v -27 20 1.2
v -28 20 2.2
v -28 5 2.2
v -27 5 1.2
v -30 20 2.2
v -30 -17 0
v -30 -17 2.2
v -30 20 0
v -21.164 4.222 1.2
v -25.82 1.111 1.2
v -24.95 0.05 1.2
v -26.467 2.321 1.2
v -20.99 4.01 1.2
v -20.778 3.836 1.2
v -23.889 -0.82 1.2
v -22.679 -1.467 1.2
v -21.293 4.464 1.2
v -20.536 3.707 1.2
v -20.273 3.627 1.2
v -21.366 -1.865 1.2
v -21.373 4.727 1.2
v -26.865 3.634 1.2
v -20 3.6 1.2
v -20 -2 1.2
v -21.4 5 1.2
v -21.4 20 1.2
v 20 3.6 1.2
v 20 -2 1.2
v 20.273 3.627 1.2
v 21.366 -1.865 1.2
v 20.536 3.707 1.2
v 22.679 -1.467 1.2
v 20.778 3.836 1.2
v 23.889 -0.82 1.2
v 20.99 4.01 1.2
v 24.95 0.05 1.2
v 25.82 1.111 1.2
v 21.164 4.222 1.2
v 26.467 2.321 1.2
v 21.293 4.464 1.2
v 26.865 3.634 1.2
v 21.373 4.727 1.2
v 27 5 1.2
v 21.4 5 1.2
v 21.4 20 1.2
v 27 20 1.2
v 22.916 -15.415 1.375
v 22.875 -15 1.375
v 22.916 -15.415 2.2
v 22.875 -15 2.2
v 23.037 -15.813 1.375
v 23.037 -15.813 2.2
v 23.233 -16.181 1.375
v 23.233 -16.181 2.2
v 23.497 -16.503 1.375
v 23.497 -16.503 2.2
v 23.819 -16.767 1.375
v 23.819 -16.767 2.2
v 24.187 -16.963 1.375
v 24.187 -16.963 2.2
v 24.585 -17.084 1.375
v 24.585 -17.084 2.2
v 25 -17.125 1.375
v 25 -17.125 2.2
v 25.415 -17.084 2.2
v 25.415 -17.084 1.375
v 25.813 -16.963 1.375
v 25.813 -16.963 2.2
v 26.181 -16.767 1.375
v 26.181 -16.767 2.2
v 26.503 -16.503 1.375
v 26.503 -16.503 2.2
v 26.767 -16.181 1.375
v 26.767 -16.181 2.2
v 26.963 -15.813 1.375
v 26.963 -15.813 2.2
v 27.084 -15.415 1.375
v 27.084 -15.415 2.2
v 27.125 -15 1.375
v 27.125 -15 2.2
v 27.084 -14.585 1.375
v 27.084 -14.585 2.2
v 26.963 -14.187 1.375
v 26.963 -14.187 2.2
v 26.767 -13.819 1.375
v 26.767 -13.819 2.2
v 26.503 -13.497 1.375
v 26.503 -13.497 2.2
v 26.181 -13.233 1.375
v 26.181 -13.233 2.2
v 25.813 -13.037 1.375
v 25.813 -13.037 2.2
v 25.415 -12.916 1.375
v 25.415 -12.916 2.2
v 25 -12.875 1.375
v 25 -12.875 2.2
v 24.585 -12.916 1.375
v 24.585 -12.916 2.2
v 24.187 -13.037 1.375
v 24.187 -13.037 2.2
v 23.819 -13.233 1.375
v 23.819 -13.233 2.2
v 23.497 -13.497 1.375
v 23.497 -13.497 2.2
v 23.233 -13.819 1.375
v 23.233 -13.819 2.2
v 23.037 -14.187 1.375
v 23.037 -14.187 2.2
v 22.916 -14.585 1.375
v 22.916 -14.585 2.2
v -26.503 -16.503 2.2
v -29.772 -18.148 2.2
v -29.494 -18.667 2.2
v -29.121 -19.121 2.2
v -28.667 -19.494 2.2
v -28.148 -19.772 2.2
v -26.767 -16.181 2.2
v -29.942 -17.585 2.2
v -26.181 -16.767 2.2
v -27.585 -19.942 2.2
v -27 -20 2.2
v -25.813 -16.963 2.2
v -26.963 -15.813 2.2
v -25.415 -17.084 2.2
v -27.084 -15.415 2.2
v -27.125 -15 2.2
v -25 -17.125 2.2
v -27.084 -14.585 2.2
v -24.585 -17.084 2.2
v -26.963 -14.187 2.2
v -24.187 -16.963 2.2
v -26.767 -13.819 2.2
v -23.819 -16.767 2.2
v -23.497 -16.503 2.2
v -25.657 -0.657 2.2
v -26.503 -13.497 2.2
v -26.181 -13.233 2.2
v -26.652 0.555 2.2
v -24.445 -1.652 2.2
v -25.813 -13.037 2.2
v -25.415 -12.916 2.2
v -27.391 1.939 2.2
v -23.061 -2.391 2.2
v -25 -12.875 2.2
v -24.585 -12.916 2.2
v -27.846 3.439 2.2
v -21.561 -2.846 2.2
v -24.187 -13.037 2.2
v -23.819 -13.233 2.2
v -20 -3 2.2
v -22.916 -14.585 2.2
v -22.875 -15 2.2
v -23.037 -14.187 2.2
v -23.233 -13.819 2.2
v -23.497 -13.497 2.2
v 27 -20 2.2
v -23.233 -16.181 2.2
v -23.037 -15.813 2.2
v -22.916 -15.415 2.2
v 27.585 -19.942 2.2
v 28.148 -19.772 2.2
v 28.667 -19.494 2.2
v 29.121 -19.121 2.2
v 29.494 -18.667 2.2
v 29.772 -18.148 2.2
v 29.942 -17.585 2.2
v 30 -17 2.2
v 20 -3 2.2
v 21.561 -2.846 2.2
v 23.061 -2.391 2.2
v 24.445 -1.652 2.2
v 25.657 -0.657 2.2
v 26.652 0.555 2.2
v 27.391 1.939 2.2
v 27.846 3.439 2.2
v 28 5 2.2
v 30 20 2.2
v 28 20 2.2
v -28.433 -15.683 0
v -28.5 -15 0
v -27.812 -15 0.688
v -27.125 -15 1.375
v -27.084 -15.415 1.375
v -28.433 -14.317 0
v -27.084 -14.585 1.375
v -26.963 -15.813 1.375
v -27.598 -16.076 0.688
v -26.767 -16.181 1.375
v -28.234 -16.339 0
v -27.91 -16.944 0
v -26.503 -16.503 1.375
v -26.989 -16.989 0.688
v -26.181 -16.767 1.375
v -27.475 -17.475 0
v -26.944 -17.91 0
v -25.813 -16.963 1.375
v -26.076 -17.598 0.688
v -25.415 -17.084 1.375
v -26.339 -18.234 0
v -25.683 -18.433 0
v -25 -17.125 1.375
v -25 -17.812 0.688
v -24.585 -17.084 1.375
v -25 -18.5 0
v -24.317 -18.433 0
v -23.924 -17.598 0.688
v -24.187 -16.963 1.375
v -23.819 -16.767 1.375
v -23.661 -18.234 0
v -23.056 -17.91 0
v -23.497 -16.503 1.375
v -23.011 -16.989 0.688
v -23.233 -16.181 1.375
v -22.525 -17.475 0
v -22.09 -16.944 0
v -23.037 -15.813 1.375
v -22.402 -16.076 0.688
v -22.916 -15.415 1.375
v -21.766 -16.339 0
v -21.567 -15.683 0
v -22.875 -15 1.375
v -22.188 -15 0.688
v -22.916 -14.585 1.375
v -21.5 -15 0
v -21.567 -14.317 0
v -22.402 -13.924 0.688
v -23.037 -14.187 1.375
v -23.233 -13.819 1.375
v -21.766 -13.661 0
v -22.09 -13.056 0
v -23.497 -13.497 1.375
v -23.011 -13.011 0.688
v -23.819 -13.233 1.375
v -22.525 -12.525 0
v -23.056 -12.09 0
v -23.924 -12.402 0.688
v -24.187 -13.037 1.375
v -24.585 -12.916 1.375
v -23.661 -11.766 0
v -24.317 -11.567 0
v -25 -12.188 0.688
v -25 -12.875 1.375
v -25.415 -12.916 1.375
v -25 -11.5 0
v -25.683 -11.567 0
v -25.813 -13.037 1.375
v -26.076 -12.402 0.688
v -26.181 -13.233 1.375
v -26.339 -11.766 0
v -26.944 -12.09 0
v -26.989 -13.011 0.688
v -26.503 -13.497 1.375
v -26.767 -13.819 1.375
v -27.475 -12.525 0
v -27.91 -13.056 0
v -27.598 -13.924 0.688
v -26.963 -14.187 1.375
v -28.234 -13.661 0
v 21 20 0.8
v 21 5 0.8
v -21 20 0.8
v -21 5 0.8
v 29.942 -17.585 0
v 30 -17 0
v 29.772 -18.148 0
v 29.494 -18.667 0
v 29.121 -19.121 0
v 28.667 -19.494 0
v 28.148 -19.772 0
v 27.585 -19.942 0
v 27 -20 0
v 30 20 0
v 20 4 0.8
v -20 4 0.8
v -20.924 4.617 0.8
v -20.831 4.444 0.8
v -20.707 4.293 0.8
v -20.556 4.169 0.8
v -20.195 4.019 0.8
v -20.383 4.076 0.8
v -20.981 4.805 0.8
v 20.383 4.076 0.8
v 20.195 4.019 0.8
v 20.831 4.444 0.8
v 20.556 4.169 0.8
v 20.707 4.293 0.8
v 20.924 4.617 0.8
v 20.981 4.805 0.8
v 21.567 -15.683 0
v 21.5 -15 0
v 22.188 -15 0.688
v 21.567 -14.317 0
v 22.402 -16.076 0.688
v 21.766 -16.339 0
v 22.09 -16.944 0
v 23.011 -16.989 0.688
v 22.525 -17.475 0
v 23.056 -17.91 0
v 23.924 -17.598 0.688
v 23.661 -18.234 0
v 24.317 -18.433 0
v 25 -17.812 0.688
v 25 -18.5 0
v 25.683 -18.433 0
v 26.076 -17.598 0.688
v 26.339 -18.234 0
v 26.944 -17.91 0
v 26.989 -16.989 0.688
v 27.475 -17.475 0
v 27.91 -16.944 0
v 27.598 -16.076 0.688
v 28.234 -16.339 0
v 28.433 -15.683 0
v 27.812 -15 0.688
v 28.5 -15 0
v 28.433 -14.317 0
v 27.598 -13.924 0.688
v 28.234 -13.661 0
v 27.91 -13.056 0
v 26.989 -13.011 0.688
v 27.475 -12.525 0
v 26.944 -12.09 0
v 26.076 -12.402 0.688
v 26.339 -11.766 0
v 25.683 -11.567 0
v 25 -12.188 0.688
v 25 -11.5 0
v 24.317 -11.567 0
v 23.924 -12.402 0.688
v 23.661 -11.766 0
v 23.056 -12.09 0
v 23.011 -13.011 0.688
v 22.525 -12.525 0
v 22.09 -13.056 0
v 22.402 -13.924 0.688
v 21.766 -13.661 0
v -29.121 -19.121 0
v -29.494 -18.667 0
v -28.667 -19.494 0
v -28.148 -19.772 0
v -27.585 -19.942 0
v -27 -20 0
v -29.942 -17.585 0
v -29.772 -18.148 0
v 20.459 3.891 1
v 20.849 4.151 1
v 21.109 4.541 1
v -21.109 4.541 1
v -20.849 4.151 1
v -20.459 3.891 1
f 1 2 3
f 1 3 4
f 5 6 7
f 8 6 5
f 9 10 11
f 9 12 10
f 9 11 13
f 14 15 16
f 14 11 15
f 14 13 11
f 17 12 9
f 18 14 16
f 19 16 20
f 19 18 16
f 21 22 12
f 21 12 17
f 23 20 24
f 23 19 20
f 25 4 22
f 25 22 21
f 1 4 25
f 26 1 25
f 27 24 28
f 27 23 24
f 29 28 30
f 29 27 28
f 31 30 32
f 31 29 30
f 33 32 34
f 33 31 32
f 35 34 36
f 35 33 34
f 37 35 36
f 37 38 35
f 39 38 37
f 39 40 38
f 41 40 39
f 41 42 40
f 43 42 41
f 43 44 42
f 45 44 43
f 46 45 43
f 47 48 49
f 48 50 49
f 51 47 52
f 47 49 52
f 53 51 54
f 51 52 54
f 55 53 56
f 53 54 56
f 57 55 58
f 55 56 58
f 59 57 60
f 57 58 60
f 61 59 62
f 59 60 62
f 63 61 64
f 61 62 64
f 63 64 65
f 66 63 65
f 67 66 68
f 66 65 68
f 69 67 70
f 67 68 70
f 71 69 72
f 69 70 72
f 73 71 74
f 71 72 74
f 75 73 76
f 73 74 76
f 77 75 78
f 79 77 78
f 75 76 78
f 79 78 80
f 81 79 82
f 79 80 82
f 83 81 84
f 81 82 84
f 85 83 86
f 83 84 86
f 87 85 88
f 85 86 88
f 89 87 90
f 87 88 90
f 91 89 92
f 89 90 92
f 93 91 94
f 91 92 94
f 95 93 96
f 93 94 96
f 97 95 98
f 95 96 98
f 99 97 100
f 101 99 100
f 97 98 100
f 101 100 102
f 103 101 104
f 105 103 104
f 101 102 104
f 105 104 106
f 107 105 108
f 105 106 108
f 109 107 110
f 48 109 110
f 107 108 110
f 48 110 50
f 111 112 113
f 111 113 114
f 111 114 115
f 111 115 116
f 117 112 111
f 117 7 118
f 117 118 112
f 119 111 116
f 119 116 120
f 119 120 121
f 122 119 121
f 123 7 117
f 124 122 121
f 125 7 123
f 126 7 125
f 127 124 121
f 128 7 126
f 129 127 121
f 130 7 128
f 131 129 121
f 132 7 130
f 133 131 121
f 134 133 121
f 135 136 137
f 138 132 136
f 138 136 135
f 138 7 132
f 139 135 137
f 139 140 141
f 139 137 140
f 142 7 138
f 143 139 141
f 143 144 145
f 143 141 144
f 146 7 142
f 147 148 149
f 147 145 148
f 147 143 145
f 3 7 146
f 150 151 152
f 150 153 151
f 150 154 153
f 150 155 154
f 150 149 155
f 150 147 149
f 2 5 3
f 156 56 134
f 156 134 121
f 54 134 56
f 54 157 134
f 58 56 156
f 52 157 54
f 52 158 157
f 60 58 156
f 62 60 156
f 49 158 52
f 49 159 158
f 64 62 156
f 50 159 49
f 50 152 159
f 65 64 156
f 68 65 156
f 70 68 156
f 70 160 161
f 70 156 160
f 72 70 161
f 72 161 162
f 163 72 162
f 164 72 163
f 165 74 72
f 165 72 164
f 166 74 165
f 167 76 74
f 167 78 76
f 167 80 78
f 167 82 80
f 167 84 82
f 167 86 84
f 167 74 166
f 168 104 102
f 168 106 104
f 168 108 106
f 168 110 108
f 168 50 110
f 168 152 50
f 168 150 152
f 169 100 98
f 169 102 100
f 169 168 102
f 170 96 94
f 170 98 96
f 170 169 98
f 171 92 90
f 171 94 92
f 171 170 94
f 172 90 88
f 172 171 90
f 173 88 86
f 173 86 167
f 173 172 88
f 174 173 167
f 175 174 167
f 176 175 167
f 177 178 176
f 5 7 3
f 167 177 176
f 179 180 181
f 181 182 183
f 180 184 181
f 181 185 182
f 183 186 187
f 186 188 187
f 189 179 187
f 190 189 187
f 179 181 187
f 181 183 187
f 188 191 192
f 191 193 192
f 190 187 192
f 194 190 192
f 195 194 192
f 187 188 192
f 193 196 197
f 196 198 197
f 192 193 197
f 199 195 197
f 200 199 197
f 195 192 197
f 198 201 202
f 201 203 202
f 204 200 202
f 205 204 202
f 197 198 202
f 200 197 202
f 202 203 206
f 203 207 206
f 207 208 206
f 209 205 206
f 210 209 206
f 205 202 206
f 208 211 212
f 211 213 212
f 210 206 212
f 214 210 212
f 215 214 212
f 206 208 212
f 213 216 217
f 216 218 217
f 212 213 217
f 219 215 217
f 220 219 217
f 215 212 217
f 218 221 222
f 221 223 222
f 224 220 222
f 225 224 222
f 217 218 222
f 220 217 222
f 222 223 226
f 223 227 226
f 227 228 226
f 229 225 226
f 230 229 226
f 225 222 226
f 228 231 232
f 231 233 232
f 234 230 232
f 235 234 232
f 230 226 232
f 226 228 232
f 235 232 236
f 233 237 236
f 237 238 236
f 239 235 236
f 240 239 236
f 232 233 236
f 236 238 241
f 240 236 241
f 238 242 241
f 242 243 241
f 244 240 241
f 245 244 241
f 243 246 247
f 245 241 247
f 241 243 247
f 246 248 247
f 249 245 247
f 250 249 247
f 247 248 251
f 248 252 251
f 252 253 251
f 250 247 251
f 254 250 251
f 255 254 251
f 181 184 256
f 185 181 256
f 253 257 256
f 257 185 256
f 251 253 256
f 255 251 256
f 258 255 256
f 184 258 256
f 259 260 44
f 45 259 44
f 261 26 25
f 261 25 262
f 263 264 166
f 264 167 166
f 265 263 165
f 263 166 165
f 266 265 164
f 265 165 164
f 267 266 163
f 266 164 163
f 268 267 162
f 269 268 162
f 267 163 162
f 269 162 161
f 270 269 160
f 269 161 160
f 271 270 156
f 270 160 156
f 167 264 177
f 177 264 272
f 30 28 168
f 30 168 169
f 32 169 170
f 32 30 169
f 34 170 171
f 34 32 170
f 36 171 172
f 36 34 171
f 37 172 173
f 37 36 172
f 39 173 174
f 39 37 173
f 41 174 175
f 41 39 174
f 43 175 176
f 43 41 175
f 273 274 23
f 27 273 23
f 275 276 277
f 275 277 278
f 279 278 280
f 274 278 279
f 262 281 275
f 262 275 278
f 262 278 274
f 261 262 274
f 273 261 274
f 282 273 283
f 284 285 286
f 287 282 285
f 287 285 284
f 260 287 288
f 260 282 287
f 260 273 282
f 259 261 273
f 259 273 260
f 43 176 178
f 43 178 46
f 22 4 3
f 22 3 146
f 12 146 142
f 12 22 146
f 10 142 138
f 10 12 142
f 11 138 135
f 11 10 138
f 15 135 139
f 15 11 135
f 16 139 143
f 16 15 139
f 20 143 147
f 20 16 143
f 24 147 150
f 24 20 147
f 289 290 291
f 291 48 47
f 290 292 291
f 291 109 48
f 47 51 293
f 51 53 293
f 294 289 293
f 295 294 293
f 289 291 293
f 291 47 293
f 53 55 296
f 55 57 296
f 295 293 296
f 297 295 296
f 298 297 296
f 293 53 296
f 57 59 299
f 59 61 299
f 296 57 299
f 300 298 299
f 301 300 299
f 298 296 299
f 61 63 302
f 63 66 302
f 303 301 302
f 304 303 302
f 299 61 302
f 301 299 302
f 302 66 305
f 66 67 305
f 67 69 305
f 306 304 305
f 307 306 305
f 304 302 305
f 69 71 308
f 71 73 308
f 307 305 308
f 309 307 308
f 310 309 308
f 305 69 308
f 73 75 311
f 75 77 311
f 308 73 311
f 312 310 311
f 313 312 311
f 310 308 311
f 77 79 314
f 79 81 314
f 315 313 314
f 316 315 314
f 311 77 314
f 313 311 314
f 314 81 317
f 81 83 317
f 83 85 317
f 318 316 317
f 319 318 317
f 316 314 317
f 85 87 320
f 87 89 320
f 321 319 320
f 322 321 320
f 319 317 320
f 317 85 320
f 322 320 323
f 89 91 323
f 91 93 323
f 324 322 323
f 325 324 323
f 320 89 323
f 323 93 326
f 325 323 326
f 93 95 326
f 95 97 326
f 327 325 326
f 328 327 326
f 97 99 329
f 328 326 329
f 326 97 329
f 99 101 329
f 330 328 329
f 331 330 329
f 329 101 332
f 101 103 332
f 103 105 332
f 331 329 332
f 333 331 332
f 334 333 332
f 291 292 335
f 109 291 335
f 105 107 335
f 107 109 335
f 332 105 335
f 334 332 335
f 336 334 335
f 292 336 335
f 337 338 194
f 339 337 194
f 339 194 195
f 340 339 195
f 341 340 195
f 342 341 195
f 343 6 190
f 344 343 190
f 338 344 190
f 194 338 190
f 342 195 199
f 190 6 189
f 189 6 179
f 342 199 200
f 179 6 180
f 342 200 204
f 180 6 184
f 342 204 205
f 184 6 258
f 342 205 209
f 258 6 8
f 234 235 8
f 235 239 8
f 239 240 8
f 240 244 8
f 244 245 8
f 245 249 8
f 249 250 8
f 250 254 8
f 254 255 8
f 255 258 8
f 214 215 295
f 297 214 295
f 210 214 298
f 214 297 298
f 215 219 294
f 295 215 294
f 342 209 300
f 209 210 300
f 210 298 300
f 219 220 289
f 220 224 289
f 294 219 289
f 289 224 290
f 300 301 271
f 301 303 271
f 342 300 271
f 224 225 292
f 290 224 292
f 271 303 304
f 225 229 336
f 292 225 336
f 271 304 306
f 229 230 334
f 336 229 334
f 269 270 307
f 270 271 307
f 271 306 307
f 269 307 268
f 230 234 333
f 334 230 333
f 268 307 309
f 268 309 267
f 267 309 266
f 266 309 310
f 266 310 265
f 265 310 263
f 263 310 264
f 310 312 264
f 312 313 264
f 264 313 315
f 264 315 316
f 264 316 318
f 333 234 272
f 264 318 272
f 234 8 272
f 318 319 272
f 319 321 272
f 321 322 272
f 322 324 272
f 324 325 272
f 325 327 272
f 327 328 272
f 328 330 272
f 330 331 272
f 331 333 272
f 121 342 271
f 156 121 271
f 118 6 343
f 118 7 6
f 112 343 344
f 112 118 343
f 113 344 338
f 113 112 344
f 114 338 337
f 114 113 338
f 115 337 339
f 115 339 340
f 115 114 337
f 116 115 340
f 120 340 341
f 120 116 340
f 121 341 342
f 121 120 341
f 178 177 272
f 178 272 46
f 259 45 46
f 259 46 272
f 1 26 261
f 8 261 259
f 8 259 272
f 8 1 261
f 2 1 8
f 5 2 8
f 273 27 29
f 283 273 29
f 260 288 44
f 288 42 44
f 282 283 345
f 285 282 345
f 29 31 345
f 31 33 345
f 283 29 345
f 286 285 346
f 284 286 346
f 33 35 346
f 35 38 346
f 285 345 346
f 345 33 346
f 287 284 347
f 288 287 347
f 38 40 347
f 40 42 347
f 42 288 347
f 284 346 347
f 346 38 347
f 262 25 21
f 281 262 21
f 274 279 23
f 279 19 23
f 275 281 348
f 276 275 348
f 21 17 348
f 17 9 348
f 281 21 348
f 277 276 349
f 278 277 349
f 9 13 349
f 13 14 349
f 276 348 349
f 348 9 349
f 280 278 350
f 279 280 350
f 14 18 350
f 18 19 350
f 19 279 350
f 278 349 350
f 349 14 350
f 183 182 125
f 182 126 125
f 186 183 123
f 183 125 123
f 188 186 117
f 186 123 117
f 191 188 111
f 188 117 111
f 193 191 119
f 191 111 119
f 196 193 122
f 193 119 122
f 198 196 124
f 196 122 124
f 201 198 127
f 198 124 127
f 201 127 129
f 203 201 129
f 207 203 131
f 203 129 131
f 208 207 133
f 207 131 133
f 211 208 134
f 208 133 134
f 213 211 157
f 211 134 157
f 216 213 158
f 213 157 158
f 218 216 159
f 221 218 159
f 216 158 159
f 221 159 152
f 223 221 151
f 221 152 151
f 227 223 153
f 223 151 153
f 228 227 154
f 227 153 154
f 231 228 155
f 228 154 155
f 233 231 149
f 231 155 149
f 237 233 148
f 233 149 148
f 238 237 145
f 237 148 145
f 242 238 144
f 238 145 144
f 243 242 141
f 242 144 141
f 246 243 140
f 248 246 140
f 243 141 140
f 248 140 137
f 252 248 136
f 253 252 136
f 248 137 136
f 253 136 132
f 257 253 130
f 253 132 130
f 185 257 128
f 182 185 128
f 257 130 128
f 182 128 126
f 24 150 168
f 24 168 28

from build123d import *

# Parameters (mm, degrees)
F0_W           = 60
F0_H           = 40
F1_DEPTH       = 2.2
F2_D           = 4.25
F2_DEPTH       = 15
F2_CSINK_D     = 7
F2_CSINK_ANGLE = 90
F2_TIP         = 1.2768288154
F3_R           = 3
F4_W           = 50
F4_H           = 20
F5_DEPTH       = 1
F6_R           = 5
F7_T4_ANGLE    = 90
F7_T9_DEPTH    = 40
F7_T14_DEPTH   = 22.7150489639
F7_T19_ANGLE   = 90
F7_T24_DEPTH   = 22.7150489639
F9_DEPTH       = 0.4
F10_T4_ANGLE   = 90
F10_T9_DEPTH   = 40
F10_T14_DEPTH  = 15
F10_T19_ANGLE  = 90
F10_T24_DEPTH  = 15


# Not quite as in the source:
# - a fillet or chamfer that OpenCascade refuses, or shapes differently, is made with other operations: its cross-section is extruded or revolved along the edge and cut away or added


with BuildPart() as f1:
    # F0 (on Top) → F1 (new body)
    with BuildSketch(Plane.XY):
        Rectangle(F0_W, F0_H)
    extrude(amount=F1_DEPTH)

    # F2
    with Locations(Plane(origin=(0, 0, 0), x_dir=(1, 0, 0), z_dir=(0, 0, -1))):
        with Locations((-25, 15), (25, 15)):
            CounterSinkHole(F2_D / 2, F2_CSINK_D / 2, depth=F2_DEPTH, counter_sink_angle=F2_CSINK_ANGLE)
            with Locations((0, 0, -(F2_DEPTH + F2_TIP / 2))):  # 118° drill point
                Cone(0, F2_D / 2, F2_TIP, mode=Mode.SUBTRACT)

    # F3
    f3_edges = [f1.edges().sort_by_distance(p)[0] for p in [
        (-30, -20, 1.1),
        (30, -20, 1.1),
    ]]
    fillet(f3_edges, radius=F3_R)

    # F4 (on face) → F5 (cut)
    with BuildSketch(Plane.XY.offset(2.2)):
        with Locations((0, 10)):
            Rectangle(F4_W, F4_H)
    extrude(amount=-F5_DEPTH, mode=Mode.SUBTRACT)

    # F6
    f6_edges = [f1.edges().sort_by_distance(p)[0] for p in [
        (25, 0, 1.7),
        (-25, 0, 1.7),
    ]]
    fillet(f6_edges, radius=F6_R)

    # F7: chamfer of 3 on 1 edges, made by hand


with BuildPart() as f7_tool2:
    # F7_s3 → F7_t4 (revolve)
    with BuildSketch(Plane.YZ.offset(20)):
        Polygon((-3, 2.2), (0, -0.8), (0, 2.2), align=None)
    revolve(axis=Axis((20, 5, 2.2), (0, 0, 1)), revolution_arc=F7_T4_ANGLE)

    split(bisect_by=Plane.XY.offset(1.2), keep=Keep.TOP)


with BuildPart() as f1_1:
    add(f1.part)

    # F7_t1: cut F7_tool2
    add(f7_tool2.part, mode=Mode.SUBTRACT)


with BuildPart() as f7_tool7:
    # F7_s8 → F7_t9 (new body)
    with BuildSketch(Plane.YZ.offset(-20)):
        Polygon((-3, 2.2), (0, -0.8), (0, 2.2), align=None)
    extrude(amount=F7_T9_DEPTH)

    split(bisect_by=Plane.XY.offset(1.2), keep=Keep.TOP)


with BuildPart() as f1_2:
    add(f1_1.part)

    # F7_t6: cut F7_tool7
    add(f7_tool7.part, mode=Mode.SUBTRACT)


with BuildPart() as f7_tool12:
    # F7_s13 → F7_t14 (new body)
    with BuildSketch(Plane.XZ.offset(-5)):
        Polygon((28, 2.2), (25, -0.8), (25, 2.2), align=None)
    extrude(amount=-F7_T14_DEPTH)

    split(bisect_by=Plane.XY.offset(1.2), keep=Keep.TOP)


with BuildPart() as f1_3:
    add(f1_2.part)

    # F7_t11: cut F7_tool12
    add(f7_tool12.part, mode=Mode.SUBTRACT)


with BuildPart() as f7_tool17:
    # F7_s18 → F7_t19 (revolve)
    with BuildSketch(Plane.XZ.offset(-5)):
        Polygon((-28, 2.2), (-25, -0.8), (-25, 2.2), align=None)
    revolve(axis=Axis((-20, 5, 2.2), (0, 0, 1)), revolution_arc=F7_T19_ANGLE)

    split(bisect_by=Plane.XY.offset(1.2), keep=Keep.TOP)


with BuildPart() as f1_4:
    add(f1_3.part)

    # F7_t16: cut F7_tool17
    add(f7_tool17.part, mode=Mode.SUBTRACT)


with BuildPart() as f7_tool22:
    # F7_s23 → F7_t24 (new body)
    with BuildSketch(Plane.XZ.offset(-27.7150489639)):
        Polygon((-28, 2.2), (-25, -0.8), (-25, 2.2), align=None)
    extrude(amount=F7_T24_DEPTH)

    split(bisect_by=Plane.XY.offset(1.2), keep=Keep.TOP)


with BuildPart() as f1_5:
    add(f1_4.part)

    # F7_t21: cut F7_tool22
    add(f7_tool22.part, mode=Mode.SUBTRACT)

    # F8 (on face) → F9 (cut)
    with BuildSketch(Plane.XY.offset(1.2)):
        with BuildLine():
            ThreePointArc((20, 3), (21.4142135624, 3.5857864376), (22, 5))
            Line((22, 5), (22, 20))
            Line((22, 20), (-22, 20))
            Line((-22, 20), (-22, 5))
            ThreePointArc((-22, 5), (-21.4142135624, 3.5857864376), (-20, 3))
            Line((-20, 3), (20, 3))
        make_face()
    extrude(amount=-F9_DEPTH, mode=Mode.SUBTRACT)

    # F10: chamfer of 1 on 1 edges, made by hand


with BuildPart() as f10_tool2:
    # F10_s3 → F10_t4 (revolve)
    with BuildSketch(Plane.YZ.offset(20)):
        Polygon((4, 0.8), (3, 1.8), (3, 0.8), align=None)
    revolve(axis=Axis((20, 5, 0.8), (0, 0, 1)), revolution_arc=F10_T4_ANGLE)

    split(bisect_by=Plane.XY.offset(1.2), keep=Keep.BOTTOM)


with BuildPart() as f1_6:
    add(f1_5.part)

    # F10_t1: union F10_tool2
    add(f10_tool2.part)


with BuildPart() as f10_tool7:
    # F10_s8 → F10_t9 (new body)
    with BuildSketch(Plane.YZ.offset(-20)):
        Polygon((4, 0.8), (3, 1.8), (3, 0.8), align=None)
    extrude(amount=F10_T9_DEPTH)

    split(bisect_by=Plane.XY.offset(1.2), keep=Keep.BOTTOM)


with BuildPart() as f1_7:
    add(f1_6.part)

    # F10_t6: union F10_tool7
    add(f10_tool7.part)


with BuildPart() as f10_tool12:
    # F10_s13 → F10_t14 (new body)
    with BuildSketch(Plane.XZ.offset(-5)):
        Polygon((21, 0.8), (22, 1.8), (22, 0.8), align=None)
    extrude(amount=-F10_T14_DEPTH)

    split(bisect_by=Plane.XY.offset(1.2), keep=Keep.BOTTOM)


with BuildPart() as f1_8:
    add(f1_7.part)

    # F10_t11: union F10_tool12
    add(f10_tool12.part)


with BuildPart() as f10_tool17:
    # F10_s18 → F10_t19 (revolve)
    with BuildSketch(Plane.XZ.offset(-5)):
        Polygon((-21, 0.8), (-22, 1.8), (-22, 0.8), align=None)
    revolve(axis=Axis((-20, 5, 0.8), (0, 0, 1)), revolution_arc=F10_T19_ANGLE)

    split(bisect_by=Plane.XY.offset(1.2), keep=Keep.BOTTOM)


with BuildPart() as f1_9:
    add(f1_8.part)

    # F10_t16: union F10_tool17
    add(f10_tool17.part)


with BuildPart() as f10_tool22:
    # F10_s23 → F10_t24 (new body)
    with BuildSketch(Plane.XZ.offset(-20)):
        Polygon((-22, 1.8), (-21, 0.8), (-22, 0.8), align=None)
    extrude(amount=F10_T24_DEPTH)

    split(bisect_by=Plane.XY.offset(1.2), keep=Keep.BOTTOM)


with BuildPart() as f1_10:
    add(f1_9.part)

    # F10_t21: union F10_tool22
    add(f10_tool22.part)


solid = f1_10.part
